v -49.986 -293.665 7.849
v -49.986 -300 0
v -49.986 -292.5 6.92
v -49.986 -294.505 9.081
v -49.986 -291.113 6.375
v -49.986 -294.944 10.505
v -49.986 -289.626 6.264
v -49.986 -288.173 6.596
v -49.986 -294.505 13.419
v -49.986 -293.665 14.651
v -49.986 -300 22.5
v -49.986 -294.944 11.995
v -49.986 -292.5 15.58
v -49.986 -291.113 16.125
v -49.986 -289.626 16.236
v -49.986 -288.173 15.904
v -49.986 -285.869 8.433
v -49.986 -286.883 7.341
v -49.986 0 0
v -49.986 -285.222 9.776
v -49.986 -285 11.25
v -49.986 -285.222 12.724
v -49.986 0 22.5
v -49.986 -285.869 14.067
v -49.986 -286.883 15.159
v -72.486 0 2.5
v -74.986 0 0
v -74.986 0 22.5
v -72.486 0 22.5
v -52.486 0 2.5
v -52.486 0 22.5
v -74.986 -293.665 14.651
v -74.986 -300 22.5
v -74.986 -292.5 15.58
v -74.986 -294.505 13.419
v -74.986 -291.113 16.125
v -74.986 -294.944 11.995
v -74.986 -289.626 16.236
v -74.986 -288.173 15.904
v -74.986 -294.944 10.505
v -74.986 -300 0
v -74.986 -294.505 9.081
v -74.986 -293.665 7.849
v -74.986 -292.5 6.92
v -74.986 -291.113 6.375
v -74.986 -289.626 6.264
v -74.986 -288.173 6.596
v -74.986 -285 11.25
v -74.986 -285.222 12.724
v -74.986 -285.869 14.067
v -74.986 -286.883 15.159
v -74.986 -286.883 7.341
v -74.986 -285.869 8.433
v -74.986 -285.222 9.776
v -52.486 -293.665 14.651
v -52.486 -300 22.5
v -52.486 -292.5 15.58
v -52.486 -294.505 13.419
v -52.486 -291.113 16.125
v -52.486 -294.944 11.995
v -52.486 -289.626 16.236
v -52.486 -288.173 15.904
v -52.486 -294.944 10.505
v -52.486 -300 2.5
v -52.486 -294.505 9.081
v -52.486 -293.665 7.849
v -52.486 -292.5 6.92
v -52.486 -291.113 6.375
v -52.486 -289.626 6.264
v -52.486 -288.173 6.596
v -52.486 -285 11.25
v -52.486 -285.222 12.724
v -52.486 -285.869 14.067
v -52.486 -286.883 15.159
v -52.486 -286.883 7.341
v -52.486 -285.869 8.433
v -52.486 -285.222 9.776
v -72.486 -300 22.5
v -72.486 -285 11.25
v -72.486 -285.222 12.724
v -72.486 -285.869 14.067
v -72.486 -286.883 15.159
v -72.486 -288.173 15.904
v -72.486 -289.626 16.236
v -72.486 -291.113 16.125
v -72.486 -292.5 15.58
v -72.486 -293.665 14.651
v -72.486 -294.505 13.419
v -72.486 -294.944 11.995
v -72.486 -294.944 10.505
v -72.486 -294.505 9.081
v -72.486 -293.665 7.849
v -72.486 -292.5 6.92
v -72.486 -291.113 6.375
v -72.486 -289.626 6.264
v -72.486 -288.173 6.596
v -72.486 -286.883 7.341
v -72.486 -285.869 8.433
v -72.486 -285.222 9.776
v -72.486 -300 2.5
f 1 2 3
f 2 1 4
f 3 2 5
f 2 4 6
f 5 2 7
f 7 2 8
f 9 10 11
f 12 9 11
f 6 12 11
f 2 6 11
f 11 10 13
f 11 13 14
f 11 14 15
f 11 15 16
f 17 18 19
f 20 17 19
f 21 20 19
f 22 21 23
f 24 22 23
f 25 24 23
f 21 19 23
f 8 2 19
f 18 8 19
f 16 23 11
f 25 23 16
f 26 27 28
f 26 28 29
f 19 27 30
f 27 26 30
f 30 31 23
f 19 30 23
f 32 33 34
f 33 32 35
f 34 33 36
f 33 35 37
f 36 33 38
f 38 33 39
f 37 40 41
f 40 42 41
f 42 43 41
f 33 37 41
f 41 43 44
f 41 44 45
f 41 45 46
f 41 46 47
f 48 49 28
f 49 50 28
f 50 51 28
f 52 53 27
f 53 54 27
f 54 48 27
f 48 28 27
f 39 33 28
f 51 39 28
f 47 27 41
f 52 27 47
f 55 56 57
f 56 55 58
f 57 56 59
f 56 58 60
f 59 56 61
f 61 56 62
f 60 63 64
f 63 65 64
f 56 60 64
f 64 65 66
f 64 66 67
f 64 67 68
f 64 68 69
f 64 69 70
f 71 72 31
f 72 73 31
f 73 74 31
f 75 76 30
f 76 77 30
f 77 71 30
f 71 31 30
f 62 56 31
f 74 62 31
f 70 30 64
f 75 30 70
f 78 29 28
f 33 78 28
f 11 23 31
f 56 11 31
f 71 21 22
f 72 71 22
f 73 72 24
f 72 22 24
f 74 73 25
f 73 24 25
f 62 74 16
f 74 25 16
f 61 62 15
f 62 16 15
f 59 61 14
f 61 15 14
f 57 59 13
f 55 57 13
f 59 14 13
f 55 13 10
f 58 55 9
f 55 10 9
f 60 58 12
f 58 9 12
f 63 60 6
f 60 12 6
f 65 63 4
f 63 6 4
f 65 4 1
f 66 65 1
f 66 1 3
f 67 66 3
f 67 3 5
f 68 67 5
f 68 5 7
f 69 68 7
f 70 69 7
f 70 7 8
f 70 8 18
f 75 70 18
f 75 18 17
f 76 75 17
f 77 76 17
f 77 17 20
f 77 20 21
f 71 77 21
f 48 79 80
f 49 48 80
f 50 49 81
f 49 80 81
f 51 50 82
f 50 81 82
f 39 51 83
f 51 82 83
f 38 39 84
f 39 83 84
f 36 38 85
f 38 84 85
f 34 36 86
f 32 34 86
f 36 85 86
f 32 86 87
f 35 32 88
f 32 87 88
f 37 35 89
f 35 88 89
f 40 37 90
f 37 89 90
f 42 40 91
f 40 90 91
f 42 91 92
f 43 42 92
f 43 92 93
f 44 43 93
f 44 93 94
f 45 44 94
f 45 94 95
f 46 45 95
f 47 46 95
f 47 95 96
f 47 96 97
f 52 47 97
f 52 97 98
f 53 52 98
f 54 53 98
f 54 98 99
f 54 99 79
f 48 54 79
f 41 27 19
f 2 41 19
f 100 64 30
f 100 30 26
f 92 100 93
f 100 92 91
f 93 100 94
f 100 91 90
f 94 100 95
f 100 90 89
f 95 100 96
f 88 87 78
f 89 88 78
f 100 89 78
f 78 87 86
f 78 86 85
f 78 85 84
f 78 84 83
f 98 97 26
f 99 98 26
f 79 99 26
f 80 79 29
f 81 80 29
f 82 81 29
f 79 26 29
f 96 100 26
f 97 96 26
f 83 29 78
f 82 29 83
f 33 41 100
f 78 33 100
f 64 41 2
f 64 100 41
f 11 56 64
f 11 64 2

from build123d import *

# Parameters (mm, degrees)
F1_DEPTH = 300
F4_R     = 5
F5_DEPTH = 84


with BuildPart() as f1:
    # F0 (on Front) → F1 (new body)
    with BuildSketch(Plane.XZ):
        Polygon((-74.9858543277, 22.5), (-74.9858543277, 0), (-49.9858543277, 0), (-49.9858543277, 22.5), (-52.4858543277, 22.5), (-52.4858543277, 20), (-52.4858543277, 2.5), (-72.4858543277, 2.5), (-72.4858543277, 20), (-72.4858543277, 22.5), align=None)
    extrude(amount=F1_DEPTH)

    # F4 (on offset) → F5 (cut)
    with BuildSketch(Plane.YZ.offset(-24.9858543277)):
        with Locations((-290, 11.25)):
            Circle(F4_R)
    extrude(amount=-F5_DEPTH, mode=Mode.SUBTRACT)


solid = f1.part
